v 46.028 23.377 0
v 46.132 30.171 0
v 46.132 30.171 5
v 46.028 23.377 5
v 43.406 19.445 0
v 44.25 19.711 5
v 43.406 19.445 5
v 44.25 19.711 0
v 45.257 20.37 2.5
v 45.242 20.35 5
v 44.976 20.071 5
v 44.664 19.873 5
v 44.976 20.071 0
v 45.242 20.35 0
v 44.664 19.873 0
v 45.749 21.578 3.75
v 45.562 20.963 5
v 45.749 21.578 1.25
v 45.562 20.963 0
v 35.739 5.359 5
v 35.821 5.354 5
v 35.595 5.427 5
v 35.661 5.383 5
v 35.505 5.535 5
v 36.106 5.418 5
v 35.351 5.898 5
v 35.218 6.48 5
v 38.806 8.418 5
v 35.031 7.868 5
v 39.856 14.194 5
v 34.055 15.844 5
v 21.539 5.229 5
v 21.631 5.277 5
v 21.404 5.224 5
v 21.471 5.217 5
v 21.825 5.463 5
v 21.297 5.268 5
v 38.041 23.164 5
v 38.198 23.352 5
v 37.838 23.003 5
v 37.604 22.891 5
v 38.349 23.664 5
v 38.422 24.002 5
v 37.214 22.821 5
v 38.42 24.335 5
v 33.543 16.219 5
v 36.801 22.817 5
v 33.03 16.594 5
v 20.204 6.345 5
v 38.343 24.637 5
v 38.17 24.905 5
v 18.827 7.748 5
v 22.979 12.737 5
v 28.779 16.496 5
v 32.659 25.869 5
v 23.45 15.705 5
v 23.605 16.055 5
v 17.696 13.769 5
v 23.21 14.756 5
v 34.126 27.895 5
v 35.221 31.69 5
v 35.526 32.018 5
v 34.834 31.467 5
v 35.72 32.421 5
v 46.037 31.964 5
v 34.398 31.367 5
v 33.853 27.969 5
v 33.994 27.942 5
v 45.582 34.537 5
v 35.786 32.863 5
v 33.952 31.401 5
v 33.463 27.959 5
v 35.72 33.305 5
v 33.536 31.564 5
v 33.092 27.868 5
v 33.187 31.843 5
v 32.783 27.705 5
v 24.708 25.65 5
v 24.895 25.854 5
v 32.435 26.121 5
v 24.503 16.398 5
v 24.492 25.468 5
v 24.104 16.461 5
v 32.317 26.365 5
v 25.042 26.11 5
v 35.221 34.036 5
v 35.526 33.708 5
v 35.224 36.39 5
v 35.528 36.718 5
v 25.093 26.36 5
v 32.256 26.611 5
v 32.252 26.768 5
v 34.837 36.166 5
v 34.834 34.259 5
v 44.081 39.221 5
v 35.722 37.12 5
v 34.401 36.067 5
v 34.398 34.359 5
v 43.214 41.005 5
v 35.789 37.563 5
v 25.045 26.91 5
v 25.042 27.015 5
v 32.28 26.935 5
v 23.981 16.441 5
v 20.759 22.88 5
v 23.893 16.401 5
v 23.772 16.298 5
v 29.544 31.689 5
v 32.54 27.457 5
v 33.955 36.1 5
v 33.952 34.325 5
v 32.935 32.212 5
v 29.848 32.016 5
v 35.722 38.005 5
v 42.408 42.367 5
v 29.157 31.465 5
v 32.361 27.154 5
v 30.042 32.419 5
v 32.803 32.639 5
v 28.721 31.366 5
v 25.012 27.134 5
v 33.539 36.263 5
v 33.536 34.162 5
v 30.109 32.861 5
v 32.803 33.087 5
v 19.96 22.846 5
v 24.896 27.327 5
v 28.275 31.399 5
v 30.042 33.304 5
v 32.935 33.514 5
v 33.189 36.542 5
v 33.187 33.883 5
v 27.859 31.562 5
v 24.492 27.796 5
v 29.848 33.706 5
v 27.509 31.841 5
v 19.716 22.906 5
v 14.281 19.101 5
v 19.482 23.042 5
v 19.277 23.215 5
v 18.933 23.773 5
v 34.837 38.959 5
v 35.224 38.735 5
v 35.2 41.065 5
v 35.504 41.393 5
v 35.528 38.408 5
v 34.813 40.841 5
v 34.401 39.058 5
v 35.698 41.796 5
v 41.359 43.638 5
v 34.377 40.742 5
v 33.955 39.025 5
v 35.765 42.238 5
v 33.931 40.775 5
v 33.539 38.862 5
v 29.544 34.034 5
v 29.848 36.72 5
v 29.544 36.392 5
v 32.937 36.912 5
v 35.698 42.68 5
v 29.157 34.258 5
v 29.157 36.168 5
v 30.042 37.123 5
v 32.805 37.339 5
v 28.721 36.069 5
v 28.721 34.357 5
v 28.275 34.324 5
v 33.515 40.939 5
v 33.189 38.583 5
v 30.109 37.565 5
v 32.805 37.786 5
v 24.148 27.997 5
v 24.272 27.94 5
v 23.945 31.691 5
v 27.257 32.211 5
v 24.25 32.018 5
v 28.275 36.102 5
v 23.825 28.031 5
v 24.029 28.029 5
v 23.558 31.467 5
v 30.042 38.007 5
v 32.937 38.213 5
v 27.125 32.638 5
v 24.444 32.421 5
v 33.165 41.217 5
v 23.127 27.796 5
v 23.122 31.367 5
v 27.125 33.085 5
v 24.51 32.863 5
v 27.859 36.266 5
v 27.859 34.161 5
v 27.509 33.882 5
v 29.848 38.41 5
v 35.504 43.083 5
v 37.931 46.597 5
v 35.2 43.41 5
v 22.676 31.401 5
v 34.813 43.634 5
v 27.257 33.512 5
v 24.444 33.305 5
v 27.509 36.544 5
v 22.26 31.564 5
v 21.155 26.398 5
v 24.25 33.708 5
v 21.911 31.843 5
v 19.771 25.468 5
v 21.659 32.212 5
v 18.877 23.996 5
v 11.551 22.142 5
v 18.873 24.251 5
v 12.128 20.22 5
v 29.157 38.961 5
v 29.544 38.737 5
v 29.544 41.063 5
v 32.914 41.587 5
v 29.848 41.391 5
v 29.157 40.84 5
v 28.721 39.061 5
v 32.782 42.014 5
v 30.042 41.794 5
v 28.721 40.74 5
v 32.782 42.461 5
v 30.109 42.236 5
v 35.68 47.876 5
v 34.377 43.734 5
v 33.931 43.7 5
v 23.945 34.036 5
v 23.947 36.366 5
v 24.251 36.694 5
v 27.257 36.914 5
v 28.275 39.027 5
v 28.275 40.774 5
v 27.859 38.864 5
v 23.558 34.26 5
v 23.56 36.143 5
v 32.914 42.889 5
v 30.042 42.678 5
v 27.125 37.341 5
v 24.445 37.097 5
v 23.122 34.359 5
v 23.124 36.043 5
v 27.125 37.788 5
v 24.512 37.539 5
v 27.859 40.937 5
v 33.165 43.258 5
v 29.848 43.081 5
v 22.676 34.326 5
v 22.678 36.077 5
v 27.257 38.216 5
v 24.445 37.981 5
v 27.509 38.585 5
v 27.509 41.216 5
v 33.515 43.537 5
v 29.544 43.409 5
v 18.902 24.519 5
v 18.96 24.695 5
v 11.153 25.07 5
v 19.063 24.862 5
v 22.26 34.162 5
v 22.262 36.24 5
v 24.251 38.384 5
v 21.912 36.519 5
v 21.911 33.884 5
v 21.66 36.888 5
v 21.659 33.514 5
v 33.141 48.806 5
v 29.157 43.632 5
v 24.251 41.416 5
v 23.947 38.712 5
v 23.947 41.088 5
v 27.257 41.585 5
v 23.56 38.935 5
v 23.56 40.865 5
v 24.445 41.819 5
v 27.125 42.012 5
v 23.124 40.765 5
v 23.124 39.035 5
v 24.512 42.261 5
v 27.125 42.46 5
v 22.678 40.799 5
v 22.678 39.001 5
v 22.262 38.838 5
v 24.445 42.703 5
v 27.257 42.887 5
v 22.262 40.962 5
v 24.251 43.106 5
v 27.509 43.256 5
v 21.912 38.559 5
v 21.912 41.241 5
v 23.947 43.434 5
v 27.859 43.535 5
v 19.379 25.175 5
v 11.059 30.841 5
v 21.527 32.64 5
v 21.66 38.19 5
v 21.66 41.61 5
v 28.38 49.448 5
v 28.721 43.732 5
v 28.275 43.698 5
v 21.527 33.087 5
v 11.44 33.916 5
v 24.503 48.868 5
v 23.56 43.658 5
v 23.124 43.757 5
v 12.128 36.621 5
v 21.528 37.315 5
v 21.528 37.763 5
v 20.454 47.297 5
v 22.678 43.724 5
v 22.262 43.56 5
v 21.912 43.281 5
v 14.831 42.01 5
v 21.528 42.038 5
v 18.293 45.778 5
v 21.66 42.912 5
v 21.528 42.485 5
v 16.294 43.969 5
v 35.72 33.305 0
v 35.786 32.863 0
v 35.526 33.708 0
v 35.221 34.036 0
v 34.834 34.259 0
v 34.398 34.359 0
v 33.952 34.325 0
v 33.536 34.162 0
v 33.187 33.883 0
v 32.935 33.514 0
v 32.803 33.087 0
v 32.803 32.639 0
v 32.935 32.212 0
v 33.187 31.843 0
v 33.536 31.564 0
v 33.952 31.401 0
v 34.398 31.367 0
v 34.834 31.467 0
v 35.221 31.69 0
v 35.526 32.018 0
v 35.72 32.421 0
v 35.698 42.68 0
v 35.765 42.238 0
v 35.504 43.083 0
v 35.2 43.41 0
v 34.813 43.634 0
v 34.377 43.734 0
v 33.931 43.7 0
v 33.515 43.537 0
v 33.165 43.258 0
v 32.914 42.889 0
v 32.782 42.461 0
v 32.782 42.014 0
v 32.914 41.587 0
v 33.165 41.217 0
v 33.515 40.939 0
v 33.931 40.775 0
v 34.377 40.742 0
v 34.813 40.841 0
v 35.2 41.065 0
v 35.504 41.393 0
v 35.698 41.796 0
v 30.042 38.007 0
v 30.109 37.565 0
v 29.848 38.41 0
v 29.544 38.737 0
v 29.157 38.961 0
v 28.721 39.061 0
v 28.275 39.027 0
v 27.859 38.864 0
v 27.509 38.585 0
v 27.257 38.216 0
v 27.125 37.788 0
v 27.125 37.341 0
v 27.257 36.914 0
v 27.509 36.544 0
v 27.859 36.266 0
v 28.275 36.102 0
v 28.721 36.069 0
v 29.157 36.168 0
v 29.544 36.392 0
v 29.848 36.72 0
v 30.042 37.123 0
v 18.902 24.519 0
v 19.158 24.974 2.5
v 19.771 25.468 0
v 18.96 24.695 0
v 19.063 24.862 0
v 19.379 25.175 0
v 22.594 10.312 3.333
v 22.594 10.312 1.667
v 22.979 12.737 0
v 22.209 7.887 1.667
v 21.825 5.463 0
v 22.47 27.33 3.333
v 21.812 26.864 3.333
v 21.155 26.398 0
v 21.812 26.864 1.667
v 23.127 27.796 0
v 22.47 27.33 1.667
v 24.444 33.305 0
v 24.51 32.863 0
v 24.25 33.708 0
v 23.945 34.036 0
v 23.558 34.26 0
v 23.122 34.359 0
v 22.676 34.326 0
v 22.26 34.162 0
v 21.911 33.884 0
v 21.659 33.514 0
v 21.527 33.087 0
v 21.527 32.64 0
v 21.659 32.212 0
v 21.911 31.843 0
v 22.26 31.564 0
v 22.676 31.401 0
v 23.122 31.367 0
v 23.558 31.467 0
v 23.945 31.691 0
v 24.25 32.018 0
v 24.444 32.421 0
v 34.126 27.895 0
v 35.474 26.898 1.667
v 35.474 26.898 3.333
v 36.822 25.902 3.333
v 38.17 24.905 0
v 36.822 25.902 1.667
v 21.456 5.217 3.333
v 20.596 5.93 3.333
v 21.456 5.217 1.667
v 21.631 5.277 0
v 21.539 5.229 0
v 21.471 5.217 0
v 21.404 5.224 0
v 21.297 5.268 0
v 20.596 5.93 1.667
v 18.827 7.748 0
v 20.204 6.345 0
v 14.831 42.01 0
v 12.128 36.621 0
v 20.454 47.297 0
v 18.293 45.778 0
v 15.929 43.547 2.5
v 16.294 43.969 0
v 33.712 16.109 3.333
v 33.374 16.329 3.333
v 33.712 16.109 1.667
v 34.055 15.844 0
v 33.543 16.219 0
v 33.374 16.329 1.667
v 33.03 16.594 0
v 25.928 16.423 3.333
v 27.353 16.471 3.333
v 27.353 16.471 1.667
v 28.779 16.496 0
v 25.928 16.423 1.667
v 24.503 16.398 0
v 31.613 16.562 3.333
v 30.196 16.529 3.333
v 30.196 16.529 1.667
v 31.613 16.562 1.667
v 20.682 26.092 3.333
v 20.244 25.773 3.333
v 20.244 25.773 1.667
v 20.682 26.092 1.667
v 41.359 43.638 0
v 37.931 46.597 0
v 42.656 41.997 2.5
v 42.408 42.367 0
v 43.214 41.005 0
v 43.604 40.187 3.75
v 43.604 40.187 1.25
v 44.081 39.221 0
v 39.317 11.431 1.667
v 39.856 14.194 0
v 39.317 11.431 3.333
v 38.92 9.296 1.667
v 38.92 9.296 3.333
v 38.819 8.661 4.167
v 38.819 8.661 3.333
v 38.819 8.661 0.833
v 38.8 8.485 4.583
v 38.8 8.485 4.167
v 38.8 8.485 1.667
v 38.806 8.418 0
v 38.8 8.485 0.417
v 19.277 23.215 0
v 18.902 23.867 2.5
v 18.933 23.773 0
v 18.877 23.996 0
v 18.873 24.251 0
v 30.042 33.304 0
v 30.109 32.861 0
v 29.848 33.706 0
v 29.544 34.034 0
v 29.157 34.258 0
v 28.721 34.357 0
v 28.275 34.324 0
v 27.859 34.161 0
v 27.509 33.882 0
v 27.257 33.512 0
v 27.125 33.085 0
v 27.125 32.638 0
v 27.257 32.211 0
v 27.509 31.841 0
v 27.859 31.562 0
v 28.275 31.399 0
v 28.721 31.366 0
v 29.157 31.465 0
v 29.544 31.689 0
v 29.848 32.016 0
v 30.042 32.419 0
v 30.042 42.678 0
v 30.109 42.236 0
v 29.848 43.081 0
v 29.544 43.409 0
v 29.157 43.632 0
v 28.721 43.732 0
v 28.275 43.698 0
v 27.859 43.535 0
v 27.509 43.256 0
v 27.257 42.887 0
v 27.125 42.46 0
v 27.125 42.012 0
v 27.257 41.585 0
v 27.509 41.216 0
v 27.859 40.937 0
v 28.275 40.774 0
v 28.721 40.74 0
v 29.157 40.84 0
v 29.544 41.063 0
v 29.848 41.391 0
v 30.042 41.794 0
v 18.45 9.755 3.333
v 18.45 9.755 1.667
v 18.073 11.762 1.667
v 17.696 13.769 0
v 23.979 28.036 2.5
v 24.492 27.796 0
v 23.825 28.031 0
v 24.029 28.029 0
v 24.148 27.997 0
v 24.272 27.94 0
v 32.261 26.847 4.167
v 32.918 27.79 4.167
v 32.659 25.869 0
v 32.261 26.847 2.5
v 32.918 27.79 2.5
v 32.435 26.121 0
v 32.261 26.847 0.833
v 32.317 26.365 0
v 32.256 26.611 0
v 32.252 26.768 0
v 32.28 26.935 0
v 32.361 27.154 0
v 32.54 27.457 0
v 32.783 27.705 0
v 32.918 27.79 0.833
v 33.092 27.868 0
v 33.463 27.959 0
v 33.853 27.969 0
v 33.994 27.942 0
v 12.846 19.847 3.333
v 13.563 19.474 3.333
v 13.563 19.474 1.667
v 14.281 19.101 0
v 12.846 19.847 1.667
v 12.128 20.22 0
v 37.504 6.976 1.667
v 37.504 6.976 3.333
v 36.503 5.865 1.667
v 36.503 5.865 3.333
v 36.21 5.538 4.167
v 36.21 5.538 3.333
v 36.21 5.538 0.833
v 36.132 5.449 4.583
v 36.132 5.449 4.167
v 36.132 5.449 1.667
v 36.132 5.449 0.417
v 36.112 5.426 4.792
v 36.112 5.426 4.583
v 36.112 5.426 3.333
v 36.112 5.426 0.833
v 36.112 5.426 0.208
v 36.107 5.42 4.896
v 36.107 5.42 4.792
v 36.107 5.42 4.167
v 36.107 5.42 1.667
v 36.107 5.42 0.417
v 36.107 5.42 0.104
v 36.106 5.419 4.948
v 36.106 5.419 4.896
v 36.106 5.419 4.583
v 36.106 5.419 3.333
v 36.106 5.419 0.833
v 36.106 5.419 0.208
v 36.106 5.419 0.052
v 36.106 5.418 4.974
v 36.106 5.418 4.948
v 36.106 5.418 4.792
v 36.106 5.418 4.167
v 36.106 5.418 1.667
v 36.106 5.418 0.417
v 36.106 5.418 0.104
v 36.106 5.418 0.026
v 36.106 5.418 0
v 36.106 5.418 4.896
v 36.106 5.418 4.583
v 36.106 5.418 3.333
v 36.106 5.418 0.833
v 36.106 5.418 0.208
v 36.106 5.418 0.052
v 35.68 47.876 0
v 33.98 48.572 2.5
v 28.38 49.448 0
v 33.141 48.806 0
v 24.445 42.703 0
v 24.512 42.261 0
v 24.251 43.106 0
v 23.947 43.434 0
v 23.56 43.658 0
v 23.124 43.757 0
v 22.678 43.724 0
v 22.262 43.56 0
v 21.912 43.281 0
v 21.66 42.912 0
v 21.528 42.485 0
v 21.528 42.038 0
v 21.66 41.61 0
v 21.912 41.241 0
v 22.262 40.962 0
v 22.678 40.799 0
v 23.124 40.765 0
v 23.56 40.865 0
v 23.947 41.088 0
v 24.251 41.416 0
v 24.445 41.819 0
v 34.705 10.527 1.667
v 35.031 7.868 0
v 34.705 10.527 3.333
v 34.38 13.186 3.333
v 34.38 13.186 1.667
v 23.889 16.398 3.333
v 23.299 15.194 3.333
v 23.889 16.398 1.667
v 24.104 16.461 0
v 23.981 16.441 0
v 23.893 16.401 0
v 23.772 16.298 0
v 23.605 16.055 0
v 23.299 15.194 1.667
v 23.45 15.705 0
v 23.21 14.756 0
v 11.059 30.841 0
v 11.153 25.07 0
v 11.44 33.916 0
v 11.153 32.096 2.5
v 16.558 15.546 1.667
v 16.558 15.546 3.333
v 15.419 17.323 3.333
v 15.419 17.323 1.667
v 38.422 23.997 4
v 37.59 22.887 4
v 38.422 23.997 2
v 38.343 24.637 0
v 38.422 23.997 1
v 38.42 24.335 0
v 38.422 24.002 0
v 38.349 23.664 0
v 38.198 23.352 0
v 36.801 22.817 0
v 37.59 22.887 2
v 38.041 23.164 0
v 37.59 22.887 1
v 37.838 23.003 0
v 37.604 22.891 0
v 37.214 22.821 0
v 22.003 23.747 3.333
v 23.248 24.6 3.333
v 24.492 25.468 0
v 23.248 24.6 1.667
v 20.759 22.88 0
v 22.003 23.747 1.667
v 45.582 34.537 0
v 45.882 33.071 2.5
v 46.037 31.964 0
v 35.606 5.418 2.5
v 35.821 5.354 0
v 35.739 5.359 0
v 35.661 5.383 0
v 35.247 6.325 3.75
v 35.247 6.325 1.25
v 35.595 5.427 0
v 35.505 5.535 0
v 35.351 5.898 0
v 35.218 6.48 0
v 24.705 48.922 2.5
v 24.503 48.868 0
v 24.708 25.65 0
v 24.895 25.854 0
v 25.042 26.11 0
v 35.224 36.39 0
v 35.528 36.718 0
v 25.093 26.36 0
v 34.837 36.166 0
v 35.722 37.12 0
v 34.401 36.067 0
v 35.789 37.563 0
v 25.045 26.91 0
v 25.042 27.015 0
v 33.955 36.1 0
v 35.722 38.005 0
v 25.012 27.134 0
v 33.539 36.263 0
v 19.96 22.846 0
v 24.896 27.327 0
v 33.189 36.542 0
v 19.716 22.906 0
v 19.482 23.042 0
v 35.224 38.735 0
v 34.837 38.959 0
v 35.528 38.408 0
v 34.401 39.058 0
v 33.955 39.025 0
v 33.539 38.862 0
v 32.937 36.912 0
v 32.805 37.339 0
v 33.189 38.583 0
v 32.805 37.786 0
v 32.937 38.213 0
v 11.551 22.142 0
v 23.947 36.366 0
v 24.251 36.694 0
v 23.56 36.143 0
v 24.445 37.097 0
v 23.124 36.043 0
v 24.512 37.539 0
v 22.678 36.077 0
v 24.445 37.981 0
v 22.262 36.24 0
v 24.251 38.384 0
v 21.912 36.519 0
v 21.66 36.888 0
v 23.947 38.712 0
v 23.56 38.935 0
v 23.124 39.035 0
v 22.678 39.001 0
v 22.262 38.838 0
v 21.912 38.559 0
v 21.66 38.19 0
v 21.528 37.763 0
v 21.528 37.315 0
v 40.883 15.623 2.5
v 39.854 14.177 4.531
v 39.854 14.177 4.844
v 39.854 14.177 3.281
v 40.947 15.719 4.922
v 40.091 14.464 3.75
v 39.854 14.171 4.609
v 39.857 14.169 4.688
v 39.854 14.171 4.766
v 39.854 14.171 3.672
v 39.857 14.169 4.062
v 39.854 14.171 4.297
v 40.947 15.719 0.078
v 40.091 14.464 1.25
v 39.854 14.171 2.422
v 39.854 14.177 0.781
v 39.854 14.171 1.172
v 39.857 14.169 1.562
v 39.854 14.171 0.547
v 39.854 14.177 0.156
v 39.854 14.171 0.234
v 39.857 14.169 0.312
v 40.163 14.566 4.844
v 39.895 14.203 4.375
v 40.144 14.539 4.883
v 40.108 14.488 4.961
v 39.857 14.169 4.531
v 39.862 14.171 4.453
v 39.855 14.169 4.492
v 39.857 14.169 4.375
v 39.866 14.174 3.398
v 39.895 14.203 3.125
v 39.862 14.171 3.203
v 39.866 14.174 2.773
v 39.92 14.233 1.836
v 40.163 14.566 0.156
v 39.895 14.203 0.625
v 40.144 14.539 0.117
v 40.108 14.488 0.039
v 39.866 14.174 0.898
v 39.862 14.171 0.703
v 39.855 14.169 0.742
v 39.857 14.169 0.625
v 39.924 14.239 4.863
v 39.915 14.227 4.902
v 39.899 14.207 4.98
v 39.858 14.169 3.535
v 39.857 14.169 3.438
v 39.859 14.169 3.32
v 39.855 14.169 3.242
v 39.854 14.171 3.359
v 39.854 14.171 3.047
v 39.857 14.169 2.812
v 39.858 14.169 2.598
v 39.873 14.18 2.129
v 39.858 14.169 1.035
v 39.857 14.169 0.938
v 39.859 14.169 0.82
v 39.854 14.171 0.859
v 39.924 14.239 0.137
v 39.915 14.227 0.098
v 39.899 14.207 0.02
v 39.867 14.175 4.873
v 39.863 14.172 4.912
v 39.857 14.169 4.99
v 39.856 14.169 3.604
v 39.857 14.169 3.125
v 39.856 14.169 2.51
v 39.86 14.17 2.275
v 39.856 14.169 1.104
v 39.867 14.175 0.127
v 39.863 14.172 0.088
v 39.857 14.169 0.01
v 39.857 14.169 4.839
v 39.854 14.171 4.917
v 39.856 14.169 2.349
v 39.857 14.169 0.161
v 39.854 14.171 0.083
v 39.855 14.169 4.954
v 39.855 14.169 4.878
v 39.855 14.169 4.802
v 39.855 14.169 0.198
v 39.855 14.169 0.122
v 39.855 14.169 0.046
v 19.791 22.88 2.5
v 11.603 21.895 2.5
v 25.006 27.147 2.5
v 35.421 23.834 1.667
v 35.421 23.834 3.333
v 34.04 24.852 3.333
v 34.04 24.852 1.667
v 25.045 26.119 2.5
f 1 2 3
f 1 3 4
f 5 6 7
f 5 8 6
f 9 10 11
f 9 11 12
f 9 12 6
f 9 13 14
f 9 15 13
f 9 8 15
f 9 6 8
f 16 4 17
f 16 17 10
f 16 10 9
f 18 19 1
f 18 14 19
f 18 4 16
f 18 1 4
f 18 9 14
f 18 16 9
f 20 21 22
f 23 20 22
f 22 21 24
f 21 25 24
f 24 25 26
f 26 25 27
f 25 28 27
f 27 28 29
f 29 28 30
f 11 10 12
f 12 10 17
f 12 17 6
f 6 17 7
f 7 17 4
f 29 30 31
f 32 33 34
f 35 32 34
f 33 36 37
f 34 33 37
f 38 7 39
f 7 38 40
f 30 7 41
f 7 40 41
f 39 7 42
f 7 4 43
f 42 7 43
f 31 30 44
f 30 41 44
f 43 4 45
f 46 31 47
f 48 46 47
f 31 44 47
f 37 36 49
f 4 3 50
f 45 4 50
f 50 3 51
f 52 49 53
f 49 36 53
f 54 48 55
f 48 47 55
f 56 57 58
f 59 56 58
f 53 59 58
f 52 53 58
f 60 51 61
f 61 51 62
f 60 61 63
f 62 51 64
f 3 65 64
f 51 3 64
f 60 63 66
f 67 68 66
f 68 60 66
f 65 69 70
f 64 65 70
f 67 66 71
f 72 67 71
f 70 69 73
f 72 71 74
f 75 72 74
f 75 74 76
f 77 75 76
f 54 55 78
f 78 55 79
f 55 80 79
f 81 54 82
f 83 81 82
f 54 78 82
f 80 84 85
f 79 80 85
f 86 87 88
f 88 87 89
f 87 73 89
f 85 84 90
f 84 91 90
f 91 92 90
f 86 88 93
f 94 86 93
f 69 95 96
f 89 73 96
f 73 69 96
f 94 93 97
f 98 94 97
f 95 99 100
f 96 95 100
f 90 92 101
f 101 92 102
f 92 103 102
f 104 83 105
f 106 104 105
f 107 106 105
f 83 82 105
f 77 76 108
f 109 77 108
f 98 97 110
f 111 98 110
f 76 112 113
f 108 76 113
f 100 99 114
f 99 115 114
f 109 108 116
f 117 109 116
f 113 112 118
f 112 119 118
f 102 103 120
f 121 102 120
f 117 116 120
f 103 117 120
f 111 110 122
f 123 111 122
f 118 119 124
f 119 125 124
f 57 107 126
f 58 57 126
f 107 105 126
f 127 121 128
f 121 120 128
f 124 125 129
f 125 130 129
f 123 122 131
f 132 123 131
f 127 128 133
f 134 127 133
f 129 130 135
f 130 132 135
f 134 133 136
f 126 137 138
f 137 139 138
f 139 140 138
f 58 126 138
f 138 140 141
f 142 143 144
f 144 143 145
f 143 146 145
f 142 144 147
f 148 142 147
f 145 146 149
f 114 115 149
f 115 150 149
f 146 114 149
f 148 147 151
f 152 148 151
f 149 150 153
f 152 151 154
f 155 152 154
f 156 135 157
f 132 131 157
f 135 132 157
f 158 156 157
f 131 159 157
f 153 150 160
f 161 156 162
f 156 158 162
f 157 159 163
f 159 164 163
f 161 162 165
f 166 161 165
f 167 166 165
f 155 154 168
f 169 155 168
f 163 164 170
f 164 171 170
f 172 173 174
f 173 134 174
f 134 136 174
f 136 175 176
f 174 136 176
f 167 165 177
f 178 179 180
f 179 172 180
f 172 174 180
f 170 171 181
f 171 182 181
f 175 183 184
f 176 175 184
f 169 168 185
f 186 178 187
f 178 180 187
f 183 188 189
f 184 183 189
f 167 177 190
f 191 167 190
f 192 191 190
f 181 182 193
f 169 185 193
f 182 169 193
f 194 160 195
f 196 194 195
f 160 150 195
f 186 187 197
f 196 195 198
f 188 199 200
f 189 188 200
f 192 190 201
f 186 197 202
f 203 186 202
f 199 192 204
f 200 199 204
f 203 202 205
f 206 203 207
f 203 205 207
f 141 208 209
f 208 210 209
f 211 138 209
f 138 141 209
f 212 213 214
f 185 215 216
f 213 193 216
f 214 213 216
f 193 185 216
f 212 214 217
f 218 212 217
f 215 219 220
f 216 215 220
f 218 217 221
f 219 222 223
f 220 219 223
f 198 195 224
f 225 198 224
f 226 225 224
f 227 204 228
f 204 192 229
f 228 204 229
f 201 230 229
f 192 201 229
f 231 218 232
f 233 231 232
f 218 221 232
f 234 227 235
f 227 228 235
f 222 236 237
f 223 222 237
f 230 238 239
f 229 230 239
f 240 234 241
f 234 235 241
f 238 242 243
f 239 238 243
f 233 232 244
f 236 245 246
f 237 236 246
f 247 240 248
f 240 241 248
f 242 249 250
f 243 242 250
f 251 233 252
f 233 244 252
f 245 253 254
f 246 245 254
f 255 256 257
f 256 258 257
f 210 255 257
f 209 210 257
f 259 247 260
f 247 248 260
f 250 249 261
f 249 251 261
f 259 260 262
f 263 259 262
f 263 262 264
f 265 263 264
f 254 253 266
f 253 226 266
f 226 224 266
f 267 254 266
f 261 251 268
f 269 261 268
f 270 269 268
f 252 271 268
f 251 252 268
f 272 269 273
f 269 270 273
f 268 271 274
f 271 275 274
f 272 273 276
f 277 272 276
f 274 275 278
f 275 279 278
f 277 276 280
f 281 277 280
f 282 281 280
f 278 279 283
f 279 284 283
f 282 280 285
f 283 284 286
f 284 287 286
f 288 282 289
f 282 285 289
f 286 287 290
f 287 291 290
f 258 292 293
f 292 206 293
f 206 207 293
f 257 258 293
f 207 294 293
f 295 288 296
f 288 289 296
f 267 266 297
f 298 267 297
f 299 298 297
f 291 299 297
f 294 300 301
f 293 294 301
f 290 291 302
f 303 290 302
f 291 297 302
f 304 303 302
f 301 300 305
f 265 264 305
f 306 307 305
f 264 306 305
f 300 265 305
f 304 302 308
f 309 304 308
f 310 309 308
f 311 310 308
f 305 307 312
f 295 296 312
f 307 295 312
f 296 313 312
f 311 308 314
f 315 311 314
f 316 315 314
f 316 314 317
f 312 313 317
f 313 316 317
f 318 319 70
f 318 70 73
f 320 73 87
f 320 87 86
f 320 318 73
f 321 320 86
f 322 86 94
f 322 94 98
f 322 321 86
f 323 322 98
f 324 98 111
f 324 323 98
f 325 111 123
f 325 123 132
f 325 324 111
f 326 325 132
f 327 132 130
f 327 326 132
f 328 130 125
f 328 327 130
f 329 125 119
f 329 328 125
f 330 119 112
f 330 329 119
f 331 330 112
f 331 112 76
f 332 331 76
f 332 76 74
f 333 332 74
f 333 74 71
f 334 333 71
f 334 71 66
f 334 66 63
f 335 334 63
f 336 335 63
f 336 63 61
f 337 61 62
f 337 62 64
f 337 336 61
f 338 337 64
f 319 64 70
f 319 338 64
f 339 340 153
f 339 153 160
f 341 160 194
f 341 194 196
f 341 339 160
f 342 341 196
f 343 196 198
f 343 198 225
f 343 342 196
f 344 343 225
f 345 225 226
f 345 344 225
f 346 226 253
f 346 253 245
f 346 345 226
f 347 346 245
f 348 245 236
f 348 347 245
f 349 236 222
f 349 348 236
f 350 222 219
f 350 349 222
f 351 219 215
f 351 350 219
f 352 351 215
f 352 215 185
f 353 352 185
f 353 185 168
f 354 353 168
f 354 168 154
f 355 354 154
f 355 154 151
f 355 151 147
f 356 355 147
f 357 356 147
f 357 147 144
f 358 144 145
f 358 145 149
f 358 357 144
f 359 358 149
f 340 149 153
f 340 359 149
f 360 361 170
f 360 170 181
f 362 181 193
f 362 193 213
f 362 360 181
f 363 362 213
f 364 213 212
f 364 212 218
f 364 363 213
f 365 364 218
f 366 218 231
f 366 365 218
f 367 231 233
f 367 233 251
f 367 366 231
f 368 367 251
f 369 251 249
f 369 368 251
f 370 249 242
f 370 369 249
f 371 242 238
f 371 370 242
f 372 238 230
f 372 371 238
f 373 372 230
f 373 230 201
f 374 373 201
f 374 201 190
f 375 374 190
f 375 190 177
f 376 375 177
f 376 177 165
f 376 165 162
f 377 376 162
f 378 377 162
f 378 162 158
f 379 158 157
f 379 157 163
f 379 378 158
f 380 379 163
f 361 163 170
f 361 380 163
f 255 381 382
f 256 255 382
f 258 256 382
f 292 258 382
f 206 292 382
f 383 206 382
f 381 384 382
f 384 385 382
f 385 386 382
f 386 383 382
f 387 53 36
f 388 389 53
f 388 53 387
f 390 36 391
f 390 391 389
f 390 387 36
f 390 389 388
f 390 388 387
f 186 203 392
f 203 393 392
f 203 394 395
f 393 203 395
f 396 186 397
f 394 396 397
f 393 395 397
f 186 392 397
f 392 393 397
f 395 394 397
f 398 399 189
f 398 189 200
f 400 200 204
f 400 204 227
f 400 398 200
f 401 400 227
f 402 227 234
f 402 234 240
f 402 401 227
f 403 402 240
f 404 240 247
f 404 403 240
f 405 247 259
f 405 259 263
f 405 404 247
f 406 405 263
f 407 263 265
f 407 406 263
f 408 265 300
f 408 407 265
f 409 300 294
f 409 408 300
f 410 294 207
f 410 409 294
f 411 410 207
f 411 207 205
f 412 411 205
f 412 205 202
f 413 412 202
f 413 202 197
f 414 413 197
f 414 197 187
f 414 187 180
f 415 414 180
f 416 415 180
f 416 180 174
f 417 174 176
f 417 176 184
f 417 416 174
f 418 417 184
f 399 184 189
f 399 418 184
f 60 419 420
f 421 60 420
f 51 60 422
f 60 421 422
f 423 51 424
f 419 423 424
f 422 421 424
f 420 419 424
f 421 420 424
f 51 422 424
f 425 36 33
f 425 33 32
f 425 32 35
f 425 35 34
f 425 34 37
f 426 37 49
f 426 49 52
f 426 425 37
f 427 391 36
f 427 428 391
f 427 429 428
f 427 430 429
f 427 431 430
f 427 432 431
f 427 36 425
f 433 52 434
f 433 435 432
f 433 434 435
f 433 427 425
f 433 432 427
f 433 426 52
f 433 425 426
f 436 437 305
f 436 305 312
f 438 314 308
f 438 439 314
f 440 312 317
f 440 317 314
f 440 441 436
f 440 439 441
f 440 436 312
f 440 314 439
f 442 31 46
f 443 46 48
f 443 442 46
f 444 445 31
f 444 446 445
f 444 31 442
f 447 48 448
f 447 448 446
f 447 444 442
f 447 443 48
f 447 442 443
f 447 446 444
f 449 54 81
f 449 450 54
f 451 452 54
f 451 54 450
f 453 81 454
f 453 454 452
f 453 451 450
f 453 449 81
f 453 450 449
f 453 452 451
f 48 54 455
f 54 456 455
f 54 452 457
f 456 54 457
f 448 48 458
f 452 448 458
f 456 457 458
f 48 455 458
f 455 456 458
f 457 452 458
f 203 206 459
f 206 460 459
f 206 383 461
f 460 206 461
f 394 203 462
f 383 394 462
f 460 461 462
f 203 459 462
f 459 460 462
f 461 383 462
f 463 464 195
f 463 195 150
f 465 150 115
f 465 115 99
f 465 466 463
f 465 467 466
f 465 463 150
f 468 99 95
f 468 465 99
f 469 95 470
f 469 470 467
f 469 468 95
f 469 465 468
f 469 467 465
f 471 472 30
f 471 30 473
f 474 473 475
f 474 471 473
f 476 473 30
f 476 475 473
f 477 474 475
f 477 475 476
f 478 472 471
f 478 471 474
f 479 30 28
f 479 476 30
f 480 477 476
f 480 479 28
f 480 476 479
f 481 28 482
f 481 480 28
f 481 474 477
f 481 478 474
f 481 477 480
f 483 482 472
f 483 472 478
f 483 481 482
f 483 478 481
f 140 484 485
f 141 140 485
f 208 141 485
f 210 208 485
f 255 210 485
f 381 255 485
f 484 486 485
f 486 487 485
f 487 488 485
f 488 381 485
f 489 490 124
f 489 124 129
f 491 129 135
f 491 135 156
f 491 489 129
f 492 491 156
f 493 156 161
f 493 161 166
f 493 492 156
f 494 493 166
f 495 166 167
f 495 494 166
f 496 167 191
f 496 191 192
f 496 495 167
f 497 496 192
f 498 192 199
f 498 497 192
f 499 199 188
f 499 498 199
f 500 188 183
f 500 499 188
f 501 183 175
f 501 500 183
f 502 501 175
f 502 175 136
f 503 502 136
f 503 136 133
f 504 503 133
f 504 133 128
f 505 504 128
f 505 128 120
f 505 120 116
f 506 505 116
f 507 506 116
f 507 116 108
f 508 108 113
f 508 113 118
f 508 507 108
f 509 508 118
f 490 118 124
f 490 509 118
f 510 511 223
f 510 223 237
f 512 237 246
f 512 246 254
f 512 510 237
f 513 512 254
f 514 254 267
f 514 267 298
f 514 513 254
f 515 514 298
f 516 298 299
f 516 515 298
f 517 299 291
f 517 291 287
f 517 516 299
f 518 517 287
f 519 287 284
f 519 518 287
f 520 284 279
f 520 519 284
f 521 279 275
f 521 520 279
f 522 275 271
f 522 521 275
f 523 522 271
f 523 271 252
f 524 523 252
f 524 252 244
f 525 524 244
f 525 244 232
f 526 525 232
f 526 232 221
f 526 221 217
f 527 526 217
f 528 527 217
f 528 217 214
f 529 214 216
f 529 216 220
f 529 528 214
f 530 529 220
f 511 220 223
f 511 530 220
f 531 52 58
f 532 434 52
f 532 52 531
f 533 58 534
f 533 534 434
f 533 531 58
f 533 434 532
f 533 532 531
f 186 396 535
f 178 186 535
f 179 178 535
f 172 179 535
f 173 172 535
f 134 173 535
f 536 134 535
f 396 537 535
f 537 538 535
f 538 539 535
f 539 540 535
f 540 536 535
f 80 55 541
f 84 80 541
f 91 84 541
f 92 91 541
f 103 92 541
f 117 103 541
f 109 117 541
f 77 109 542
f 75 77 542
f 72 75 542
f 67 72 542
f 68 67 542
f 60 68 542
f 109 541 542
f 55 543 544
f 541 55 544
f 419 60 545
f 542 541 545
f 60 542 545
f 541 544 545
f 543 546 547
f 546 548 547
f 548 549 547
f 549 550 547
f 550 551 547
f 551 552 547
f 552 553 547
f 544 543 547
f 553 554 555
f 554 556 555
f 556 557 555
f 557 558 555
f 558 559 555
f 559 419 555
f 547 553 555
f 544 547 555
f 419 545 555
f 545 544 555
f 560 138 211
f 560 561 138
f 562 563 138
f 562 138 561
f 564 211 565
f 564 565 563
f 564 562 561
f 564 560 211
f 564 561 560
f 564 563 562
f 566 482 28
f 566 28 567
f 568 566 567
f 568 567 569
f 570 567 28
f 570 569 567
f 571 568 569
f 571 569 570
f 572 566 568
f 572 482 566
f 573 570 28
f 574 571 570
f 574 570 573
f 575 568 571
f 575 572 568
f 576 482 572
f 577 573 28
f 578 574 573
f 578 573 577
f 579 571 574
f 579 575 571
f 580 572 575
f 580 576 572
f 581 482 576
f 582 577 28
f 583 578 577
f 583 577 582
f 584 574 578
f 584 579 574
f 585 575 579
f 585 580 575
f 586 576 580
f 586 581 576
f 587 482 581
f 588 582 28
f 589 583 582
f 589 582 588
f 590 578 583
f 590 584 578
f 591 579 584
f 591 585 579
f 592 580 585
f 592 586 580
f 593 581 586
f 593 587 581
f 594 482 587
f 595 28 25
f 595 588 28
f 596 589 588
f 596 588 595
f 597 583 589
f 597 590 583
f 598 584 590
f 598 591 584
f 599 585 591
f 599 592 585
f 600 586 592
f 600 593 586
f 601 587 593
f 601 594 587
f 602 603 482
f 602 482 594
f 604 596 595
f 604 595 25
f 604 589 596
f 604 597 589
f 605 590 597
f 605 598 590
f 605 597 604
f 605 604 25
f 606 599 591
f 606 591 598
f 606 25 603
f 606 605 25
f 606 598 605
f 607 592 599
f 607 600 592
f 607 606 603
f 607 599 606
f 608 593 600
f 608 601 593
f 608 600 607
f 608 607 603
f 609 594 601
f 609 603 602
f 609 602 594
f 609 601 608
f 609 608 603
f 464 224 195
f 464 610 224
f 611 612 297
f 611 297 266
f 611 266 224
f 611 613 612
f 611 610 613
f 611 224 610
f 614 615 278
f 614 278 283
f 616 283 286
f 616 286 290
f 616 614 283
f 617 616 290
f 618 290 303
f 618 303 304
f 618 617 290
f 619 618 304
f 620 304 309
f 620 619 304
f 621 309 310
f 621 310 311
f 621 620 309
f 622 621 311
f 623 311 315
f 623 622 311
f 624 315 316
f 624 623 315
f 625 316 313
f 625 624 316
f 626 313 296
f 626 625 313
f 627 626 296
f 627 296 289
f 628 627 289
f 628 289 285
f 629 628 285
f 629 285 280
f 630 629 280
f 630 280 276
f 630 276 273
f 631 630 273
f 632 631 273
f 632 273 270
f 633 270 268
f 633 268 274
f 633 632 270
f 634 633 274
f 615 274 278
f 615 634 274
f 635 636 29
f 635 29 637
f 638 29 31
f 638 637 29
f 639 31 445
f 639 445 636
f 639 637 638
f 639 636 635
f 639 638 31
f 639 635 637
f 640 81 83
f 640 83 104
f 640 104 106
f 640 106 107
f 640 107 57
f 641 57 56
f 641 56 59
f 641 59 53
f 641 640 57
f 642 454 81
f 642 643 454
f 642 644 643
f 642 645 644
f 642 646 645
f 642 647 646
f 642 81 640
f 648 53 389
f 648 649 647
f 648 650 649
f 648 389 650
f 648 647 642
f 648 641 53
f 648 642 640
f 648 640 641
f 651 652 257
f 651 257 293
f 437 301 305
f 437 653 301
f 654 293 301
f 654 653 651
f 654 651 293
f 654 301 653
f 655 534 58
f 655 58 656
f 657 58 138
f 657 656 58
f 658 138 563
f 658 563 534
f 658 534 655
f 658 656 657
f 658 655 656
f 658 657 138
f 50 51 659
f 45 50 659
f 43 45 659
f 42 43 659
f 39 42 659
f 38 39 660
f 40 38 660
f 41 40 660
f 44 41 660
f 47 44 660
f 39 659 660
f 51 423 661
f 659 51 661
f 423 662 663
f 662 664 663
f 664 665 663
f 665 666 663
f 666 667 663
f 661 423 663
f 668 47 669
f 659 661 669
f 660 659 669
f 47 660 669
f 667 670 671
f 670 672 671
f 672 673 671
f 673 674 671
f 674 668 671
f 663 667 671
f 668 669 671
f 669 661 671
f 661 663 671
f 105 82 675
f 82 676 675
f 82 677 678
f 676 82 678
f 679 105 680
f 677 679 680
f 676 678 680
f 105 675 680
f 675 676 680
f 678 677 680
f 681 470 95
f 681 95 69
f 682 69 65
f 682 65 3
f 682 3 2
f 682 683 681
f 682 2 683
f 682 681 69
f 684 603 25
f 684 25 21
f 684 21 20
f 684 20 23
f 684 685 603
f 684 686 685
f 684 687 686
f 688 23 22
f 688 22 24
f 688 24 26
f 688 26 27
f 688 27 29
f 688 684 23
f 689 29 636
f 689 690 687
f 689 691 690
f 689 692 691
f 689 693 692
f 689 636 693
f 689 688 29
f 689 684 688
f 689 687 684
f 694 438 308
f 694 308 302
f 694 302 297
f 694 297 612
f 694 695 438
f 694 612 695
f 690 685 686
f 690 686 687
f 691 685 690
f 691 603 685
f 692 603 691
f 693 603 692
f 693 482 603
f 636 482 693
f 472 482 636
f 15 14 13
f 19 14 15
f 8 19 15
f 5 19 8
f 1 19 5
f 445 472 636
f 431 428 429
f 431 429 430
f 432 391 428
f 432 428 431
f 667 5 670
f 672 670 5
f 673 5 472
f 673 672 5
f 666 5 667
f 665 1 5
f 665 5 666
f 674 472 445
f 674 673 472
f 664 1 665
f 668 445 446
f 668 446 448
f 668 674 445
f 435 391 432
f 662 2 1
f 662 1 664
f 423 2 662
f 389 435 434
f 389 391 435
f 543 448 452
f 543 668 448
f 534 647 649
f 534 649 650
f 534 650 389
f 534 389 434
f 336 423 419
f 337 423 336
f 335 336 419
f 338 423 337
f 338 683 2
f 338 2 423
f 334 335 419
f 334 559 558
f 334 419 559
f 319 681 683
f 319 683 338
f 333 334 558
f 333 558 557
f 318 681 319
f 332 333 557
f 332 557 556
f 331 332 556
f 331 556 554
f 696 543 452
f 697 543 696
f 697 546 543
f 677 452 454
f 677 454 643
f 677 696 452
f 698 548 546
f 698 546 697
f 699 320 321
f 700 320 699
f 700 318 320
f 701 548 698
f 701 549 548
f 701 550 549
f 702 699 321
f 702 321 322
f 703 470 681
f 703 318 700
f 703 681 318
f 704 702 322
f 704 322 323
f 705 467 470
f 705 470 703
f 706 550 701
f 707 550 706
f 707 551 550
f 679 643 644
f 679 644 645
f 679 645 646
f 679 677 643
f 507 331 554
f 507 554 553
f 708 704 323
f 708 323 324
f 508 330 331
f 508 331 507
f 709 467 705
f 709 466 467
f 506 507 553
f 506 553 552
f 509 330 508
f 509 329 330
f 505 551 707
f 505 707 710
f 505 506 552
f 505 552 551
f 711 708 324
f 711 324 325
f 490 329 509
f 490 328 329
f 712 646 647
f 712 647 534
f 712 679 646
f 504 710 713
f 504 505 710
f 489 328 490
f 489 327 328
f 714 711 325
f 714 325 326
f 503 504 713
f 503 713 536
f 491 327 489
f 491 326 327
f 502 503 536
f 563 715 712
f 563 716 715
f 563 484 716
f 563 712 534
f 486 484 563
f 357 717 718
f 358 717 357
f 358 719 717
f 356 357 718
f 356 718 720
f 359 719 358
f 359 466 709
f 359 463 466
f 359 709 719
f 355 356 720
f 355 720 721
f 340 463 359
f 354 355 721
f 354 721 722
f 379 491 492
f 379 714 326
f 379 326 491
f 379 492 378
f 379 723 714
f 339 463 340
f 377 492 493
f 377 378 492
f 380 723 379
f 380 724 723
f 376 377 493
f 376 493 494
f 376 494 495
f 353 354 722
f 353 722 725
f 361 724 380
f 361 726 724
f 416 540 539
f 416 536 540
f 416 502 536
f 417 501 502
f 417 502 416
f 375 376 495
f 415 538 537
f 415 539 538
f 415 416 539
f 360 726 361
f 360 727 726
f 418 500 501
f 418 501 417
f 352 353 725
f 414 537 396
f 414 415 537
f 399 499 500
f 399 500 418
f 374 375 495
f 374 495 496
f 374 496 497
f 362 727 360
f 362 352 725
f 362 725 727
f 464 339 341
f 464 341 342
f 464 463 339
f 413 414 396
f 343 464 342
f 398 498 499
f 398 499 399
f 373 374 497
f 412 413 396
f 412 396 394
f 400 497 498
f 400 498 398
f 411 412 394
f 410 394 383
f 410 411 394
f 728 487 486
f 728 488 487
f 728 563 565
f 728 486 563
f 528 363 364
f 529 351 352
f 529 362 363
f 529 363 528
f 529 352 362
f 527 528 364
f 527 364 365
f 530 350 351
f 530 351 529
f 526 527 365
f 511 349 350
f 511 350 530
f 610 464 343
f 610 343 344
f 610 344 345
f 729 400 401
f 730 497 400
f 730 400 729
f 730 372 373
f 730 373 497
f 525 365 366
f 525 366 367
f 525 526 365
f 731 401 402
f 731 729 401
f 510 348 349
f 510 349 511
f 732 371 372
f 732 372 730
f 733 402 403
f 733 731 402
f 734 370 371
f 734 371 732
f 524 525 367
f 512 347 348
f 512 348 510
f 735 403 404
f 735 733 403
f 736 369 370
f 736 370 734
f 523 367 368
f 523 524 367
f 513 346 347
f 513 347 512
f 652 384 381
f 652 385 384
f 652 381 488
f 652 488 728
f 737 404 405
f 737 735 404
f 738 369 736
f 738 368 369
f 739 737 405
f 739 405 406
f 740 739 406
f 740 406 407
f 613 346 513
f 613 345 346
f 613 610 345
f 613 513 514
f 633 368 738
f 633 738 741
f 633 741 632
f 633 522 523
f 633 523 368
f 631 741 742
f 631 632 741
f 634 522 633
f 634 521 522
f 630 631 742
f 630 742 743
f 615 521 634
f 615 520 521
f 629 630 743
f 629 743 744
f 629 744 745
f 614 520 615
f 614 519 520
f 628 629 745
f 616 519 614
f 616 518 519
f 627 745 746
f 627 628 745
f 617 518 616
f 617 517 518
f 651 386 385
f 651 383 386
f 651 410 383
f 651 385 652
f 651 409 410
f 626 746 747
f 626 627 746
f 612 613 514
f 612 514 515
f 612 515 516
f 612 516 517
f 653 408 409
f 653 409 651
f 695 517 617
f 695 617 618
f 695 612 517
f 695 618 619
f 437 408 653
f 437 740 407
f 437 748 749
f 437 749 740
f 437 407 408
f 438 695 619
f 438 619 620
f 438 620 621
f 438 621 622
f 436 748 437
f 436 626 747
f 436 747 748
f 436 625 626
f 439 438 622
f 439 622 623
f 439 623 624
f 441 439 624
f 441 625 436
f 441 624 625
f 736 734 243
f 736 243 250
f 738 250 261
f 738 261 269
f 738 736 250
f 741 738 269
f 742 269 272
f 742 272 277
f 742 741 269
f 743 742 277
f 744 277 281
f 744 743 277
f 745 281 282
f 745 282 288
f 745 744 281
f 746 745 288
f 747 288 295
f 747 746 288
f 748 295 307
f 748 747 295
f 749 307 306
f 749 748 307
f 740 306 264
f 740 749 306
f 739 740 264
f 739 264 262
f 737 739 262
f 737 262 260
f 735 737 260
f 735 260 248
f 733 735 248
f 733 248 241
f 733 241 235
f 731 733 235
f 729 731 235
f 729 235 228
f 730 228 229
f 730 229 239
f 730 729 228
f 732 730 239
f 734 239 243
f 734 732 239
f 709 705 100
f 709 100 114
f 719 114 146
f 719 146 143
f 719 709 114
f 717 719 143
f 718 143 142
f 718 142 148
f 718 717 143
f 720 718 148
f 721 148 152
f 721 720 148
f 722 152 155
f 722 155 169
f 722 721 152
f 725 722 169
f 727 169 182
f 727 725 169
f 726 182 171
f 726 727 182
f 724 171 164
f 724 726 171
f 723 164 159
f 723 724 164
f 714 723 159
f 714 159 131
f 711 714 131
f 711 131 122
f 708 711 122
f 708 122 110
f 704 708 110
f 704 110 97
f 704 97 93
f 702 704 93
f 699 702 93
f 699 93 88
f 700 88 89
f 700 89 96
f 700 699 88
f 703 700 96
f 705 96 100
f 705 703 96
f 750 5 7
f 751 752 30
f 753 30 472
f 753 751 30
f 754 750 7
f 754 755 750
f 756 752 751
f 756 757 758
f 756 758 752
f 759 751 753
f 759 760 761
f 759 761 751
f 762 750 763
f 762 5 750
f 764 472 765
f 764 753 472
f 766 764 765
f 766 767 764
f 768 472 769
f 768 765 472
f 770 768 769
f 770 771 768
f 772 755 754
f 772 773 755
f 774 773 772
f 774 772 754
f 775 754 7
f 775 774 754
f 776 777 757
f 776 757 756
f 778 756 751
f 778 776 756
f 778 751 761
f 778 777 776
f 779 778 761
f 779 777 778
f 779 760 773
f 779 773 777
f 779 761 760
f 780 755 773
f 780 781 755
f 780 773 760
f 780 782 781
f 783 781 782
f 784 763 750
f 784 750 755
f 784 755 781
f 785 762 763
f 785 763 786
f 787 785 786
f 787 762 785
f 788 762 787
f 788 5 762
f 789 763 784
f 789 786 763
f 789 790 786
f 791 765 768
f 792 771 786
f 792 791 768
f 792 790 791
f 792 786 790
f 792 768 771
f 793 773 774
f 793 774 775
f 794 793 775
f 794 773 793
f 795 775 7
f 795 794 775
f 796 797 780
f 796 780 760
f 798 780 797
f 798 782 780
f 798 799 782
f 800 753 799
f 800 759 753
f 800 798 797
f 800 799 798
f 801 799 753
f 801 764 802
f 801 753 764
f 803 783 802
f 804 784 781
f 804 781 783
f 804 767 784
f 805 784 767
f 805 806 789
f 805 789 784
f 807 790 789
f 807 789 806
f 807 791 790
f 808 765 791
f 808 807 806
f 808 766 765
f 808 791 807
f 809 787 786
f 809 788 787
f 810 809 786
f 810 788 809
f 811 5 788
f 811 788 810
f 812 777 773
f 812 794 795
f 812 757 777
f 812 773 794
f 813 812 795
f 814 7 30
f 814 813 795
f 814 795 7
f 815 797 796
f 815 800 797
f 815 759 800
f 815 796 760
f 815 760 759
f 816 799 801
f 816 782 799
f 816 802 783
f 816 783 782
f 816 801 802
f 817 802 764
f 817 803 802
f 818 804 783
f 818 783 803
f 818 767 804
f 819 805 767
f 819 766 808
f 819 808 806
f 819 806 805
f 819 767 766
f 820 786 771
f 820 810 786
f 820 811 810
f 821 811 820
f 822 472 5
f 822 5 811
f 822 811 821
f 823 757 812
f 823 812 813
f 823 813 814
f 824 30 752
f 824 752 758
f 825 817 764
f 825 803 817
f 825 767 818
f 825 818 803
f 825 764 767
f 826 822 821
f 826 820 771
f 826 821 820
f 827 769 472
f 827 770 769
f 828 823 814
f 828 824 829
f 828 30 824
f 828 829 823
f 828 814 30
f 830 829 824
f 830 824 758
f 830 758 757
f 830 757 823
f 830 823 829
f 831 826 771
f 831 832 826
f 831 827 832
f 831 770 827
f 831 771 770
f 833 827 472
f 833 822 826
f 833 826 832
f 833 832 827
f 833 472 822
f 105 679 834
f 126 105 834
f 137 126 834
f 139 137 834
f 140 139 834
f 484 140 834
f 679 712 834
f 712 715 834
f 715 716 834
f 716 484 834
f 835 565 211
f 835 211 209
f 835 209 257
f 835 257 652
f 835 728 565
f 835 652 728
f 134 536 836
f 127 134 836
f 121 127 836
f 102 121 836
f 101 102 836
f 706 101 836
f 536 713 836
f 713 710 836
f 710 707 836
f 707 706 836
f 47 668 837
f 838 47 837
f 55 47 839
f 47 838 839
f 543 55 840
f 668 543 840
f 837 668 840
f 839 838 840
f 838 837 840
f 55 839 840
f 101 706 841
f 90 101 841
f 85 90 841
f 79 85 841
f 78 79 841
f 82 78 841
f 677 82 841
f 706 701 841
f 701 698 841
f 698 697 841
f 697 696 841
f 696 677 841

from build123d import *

# Parameters (mm, degrees)
F2_DEPTH = 5
F1_R     = 1.5
F3_DEPTH = 5


with BuildPart() as f2:
    # F0 (on Top) → F2 (new body)
    with BuildSketch(Plane.XY):
        with BuildLine():
            add(Edge.make_bspline(
                [(28.7786647677, 16.4962057024), (27.3534332712, 16.4962057024), (25.9282017748, 16.3979139179), (24.5029702783, 16.3979139179)],
                knots=[0, 0, 0, 0, 4.2768241304, 4.2768241304, 4.2768241304, 4.2768241304], degree=3))
            add(Edge.make_bspline(
                [(28.7786647677, 16.4962057024), (30.1958868901, 16.5288864324), (31.6131090124, 16.5615671625), (33.0303311348, 16.5942478925)],
                knots=[0, 0, 0, 0, 4.252796629, 4.252796629, 4.252796629, 4.252796629], degree=3))
            add(Edge.make_bspline(
                [(34.0554304421, 15.8441737294), (33.7053959568, 16.1608718336), (33.3803656201, 16.2775497884), (33.0303311348, 16.5942478925)],
                knots=[0, 0, 0, 0, 1.2702125176, 1.2702125176, 1.2702125176, 1.2702125176], degree=3))
            add(Edge.make_bspline(
                [(35.030528903, 7.8683812171), (34.7054960827, 10.5269787212), (34.3804632624, 13.1855762253), (34.0554304421, 15.8441737294)],
                knots=[0, 0, 0, 0, 8.0351778579, 8.0351778579, 8.0351778579, 8.0351778579], degree=3))
            add(Edge.make_bspline(
                [(36.1056365073, 5.4181381129), (35.9264295305, 5.3620166626), (35.3451776861, 5.1799886127), (35.15918074, 6.7691662645), (35.030528903, 7.8683812171)],
                knots=[0, 0, 0, 0, 0.3083121001, 1, 1, 1, 1], degree=3))
            add(Edge.make_bspline(
                [(38.8059057295, 8.4184361622), (37.4535769802, 6.9203687349), (36.1012482309, 5.4223013077), (36.1056365073, 5.4181381129)],
                knots=[0, 0, 0, 0, 0.9144176852, 0.9144176852, 0.9144176852, 0.9144176852], degree=3))
            add(Edge.make_bspline(
                [(39.8560129106, 14.1940098256), (39.2937416175, 11.3257224468), (38.7314703243, 8.4574350679), (38.8059057295, 8.4184361622)],
                knots=[0, 0, 0, 0, 0.9279806118, 0.9279806118, 0.9279806118, 0.9279806118], degree=3))
            add(Edge.make_bspline(
                [(43.4063635767, 19.4445308298), (41.6661026772, 16.796114764), (39.8167199055, 13.9816315759), (39.8538236249, 14.1821767609), (39.8560129106, 14.1940098256)],
                knots=[0, 0, 0, 0, 0.9409955181, 1, 1, 1, 1], degree=3))
            add(Edge.make_bspline(
                [(46.1316332221, 30.1705934107), (46.201065216, 26.0141822855), (46.2669693032, 19.7845163706), (44.1314354539, 19.7195578367), (43.4063635767, 19.4445308298)],
                knots=[0, 0, 0, 0, 0.6856364339, 1, 1, 1, 1], degree=3))
            add(Edge.make_bspline(
                [(44.0814308822, 39.2214953899), (44.942471716, 37.026856873), (45.9936424251, 33.4912353698), (46.1571893395, 30.7073156698), (46.1316332221, 30.1705934107)],
                knots=[0, 0, 0, 0, 0.5973818248, 1, 1, 1, 1], degree=3))
            add(Edge.make_bspline(
                [(37.9308201373, 46.5972237289), (39.7218772443, 45.1967775697), (42.7448053753, 42.833118659), (43.922661607, 39.3325250293), (44.0814308822, 39.2214953899)],
                knots=[0, 0, 0, 0, 0.5634229372, 0.9509395541, 0.9509395541, 0.9509395541, 0.9509395541], degree=3))
            add(Edge.make_bspline(
                [(28.3798743039, 49.4475066662), (30.3463351664, 49.2764352977), (34.0485912428, 48.954359214), (36.6916346322, 47.3496080436), (37.9308201373, 46.5972237289)],
                knots=[0, 0, 0, 0, 0.5311520386, 1, 1, 1, 1], degree=3))
            add(Edge.make_bspline(
                [(20.4540863633, 47.2972951829), (21.8867810289, 47.9304252414), (24.6135730188, 49.1354370372), (27.1677144968, 49.3470690664), (28.3798743039, 49.4475066662)],
                knots=[0, 0, 0, 0, 0.5254139923, 1, 1, 1, 1], degree=3))
            add(Edge.make_bspline(
                [(12.128260918, 36.621235311), (13.2656434176, 39.1604577253), (15.3840794859, 43.8898960188), (18.8493227012, 46.2187817818), (20.4540863633, 47.2972951829)],
                knots=[0, 0, 0, 0, 0.5368972501, 1, 1, 1, 1], degree=3))
            add(Edge.make_bspline(
                [(11.1531633884, 25.0700879842), (11.0426565419, 27.5454372876), (10.8424476096, 32.0301100206), (11.730414239, 35.2006838689), (12.128260918, 36.621235311)],
                knots=[0, 0, 0, 0, 0.5519576234, 1, 1, 1, 1], degree=3))
            add(Edge.make_bspline(
                [(12.128260918, 20.2196072787), (11.9396298399, 20.7302181813), (11.4960442281, 21.93097286), (11.2783087006, 23.9243676733), (11.1531633884, 25.0700879842)],
                knots=[0, 0, 0, 0, 0.4252416515, 1, 1, 1, 1], degree=3))
            add(Edge.make_bspline(
                [(14.2806209624, 19.1009379923), (13.5631676142, 19.4738277545), (12.8457142661, 19.8467175166), (12.128260918, 20.2196072787)],
                knots=[0, 0, 0, 0, 2.4257111809, 2.4257111809, 2.4257111809, 2.4257111809], degree=3))
            add(Edge.make_bspline(
                [(17.6962614059, 13.7686077505), (16.5577145914, 15.5460511645), (15.4191677769, 17.3234945784), (14.2806209624, 19.1009379923)],
                knots=[0, 0, 0, 0, 6.3324833555, 6.3324833555, 6.3324833555, 6.3324833555], degree=3))
            add(Edge.make_bspline(
                [(18.826616928, 7.7482336201), (18.449831754, 9.7550249969), (18.07304658, 11.7618163737), (17.6962614059, 13.7686077505)],
                knots=[0, 0, 0, 0, 6.1255700369, 6.1255700369, 6.1255700369, 6.1255700369], degree=3))
            add(Edge.make_bspline(
                [(21.8245182186, 5.4629491642), (21.7108202341, 5.3376502894), (21.4165861788, 5.0133947963), (20.4957638936, 6.0671498654), (19.4532904711, 7.1170784645), (18.826616928, 7.7482336201)],
                knots=[0, 0, 0, 0, 0.2007630192, 0.5195458611, 1, 1, 1, 1], degree=3))
            add(Edge.make_bspline(
                [(22.9794476181, 12.7365430817), (22.5944711516, 10.3120117759), (22.2094946851, 7.88748047), (21.8245182186, 5.4629491642)],
                knots=[0, 0, 0, 0, 7.3647152283, 7.3647152283, 7.3647152283, 7.3647152283], degree=3))
            add(Edge.make_bspline(
                [(24.5029702783, 16.3979139179), (24.2545480757, 16.457738394), (23.7733196994, 16.5750358032), (23.1531511766, 15.0702995523), (23.0738569515, 13.5969865217), (22.9794476181, 12.7365430817)],
                knots=[0, 0, 0, 0, 0.2229298737, 0.552268584, 1, 1, 1, 1], degree=3))
        make_face()
        with BuildLine():
            add(Edge.make_bspline(
                [(19.7707619518, 25.4675038159), (20.2849085132, 25.757982706), (20.6410096337, 26.1077272395), (21.1551561952, 26.3982061297)],
                knots=[0, 0, 0, 0, 1.6681589307, 1.6681589307, 1.6681589307, 1.6681589307], degree=3))
            add(Edge.make_bspline(
                [(21.1551561952, 26.3982061297), (21.8123979867, 26.8640990059), (22.4696397781, 27.329991882), (23.1268815696, 27.7958847582)],
                knots=[0, 0, 0, 0, 2.4168588087, 2.4168588087, 2.4168588087, 2.4168588087], degree=3))
            add(Edge.make_bspline(
                [(23.1268815696, 27.7958847582), (23.4302642999, 27.9257749489), (23.9764650926, 28.1596251916), (24.333578659, 27.9078247286), (24.4923364371, 27.7958847582)],
                knots=[0, 0, 0, 0, 0.5554417612, 1, 1, 1, 1], degree=3))
            add(Edge.make_bspline(
                [(24.4923364371, 27.7958847582), (24.7112412104, 27.5568410681), (25.0480976986, 27.1889942788), (25.0461675905, 26.9821026564), (25.045491755, 26.9096586853)],
                knots=[0, 0, 0, 0, 0.6498457975, 1, 1, 1, 1], degree=3))
            add(Edge.make_bspline(
                [(25.045491755, 26.9096586853), (25.0901061339, 26.6330206678), (25.1757880791, 26.0779728274), (24.7261609493, 25.6500168981), (24.4923364371, 25.4675038159)],
                knots=[0, 0, 0, 0, 0.4901555982, 1, 1, 1, 1], degree=3))
            add(Edge.make_bspline(
                [(24.4923364371, 25.4675038159), (23.2477368166, 24.5850893358), (22.0031371961, 23.7619404991), (20.7585375756, 22.8795260191)],
                knots=[0, 0, 0, 0, 4.5430037437, 4.5430037437, 4.5430037437, 4.5430037437], degree=3))
            add(Edge.make_bspline(
                [(20.7585375756, 22.8795260191), (20.405901409, 22.8403885896), (19.7724884957, 22.7700890696), (19.4290917953, 23.0786102264), (19.2768722773, 23.2153702527)],
                knots=[0, 0, 0, 0, 0.5567239935, 1, 1, 1, 1], degree=3))
            add(Edge.make_bspline(
                [(19.2768722773, 23.2153702527), (19.1175545535, 23.4298293637), (18.8164909813, 23.845577707), (18.8726020293, 24.2868788492), (18.9015176147, 24.5192367584)],
                knots=[0, 0, 0, 0, 0.5178862764, 1, 1, 1, 1], degree=3))
            add(Edge.make_bspline(
                [(18.9015176147, 24.5192367584), (18.9318202689, 24.6817342211), (19.1368350812, 25.0158121965), (19.5525943822, 25.3099724303), (19.7707619518, 25.4675038159)],
                knots=[0, 0, 0, 0, 0.4488819495, 1, 1, 1, 1], degree=3))
        make_face(mode=Mode.SUBTRACT)
        with BuildLine():
            add(Edge.make_bspline(
                [(32.6592810452, 25.869358331), (32.4509113562, 26.0499476175), (32.2939669471, 26.3610240009), (32.1994835702, 26.8554791141), (32.5083631343, 27.4777518027), (32.8954510162, 27.8253639918), (33.5004289129, 27.9999233062), (33.9412095353, 27.9802175247), (34.1260544956, 27.8949011117)],
                knots=[0, 0, 0, 0, 0.1726951713, 0.3215696796, 0.4991474643, 0.6559863652, 0.8270618313, 1, 1, 1, 1], degree=3))
            add(Edge.make_bspline(
                [(34.1260544956, 27.8949011117), (35.4740905265, 26.8984256933), (36.8221265574, 25.9019502749), (38.1701625884, 24.9054748565)],
                knots=[0, 0, 0, 0, 5.0290634915, 5.0290634915, 5.0290634915, 5.0290634915], degree=3))
            add(Edge.make_bspline(
                [(38.1701625884, 24.9054748565), (38.2405595194, 24.8143368767), (38.4020654987, 24.6052463887), (38.470948132, 23.977433478), (38.2329838854, 23.2694437637), (37.6073773996, 22.8025261291), (37.0741936096, 22.8121444764), (36.8011705577, 22.8170696646)],
                knots=[0, 0, 0, 0, 0.1512568335, 0.3470163066, 0.5621197723, 0.7757782618, 1, 1, 1, 1], degree=3))
            add(Edge.make_bspline(
                [(36.8011705577, 22.8170696646), (35.4205407202, 23.8344992201), (34.0399108827, 24.8519287755), (32.6592810452, 25.869358331)],
                knots=[0, 0, 0, 0, 5.1450670391, 5.1450670391, 5.1450670391, 5.1450670391], degree=3))
        make_face(mode=Mode.SUBTRACT)
    extrude(amount=F2_DEPTH)

    # F1 (on face) → F3 (cut)
    with BuildSketch(Plane.XY):
        with Locations((23.01017569, 32.86326798)):
            Circle(F1_R)
        with Locations((-15598.762805792, 35.025678575)):
            Circle(F1_R)
        with Locations((34.2861823738, 32.8629463911)):
            Circle(F1_R)
        with Locations((23.0116825551, 37.5390388072)):
            Circle(F1_R)
        with Locations((28.6087393761, 37.5647246838)):
            Circle(F1_R)
        with Locations((34.2885330319, 37.5625342131)):
            Circle(F1_R)
        with Locations((23.0116825551, 42.2612205148)):
            Circle(F1_R)
        with Locations((28.6087393761, 42.23600775)):
            Circle(F1_R)
        with Locations((34.265037626, 42.2377288342)):
            Circle(F1_R)
        with Locations((28.6087393761, 32.8614637256)):
            Circle(F1_R)
    extrude(amount=F3_DEPTH, mode=Mode.SUBTRACT)


solid = f2.part
